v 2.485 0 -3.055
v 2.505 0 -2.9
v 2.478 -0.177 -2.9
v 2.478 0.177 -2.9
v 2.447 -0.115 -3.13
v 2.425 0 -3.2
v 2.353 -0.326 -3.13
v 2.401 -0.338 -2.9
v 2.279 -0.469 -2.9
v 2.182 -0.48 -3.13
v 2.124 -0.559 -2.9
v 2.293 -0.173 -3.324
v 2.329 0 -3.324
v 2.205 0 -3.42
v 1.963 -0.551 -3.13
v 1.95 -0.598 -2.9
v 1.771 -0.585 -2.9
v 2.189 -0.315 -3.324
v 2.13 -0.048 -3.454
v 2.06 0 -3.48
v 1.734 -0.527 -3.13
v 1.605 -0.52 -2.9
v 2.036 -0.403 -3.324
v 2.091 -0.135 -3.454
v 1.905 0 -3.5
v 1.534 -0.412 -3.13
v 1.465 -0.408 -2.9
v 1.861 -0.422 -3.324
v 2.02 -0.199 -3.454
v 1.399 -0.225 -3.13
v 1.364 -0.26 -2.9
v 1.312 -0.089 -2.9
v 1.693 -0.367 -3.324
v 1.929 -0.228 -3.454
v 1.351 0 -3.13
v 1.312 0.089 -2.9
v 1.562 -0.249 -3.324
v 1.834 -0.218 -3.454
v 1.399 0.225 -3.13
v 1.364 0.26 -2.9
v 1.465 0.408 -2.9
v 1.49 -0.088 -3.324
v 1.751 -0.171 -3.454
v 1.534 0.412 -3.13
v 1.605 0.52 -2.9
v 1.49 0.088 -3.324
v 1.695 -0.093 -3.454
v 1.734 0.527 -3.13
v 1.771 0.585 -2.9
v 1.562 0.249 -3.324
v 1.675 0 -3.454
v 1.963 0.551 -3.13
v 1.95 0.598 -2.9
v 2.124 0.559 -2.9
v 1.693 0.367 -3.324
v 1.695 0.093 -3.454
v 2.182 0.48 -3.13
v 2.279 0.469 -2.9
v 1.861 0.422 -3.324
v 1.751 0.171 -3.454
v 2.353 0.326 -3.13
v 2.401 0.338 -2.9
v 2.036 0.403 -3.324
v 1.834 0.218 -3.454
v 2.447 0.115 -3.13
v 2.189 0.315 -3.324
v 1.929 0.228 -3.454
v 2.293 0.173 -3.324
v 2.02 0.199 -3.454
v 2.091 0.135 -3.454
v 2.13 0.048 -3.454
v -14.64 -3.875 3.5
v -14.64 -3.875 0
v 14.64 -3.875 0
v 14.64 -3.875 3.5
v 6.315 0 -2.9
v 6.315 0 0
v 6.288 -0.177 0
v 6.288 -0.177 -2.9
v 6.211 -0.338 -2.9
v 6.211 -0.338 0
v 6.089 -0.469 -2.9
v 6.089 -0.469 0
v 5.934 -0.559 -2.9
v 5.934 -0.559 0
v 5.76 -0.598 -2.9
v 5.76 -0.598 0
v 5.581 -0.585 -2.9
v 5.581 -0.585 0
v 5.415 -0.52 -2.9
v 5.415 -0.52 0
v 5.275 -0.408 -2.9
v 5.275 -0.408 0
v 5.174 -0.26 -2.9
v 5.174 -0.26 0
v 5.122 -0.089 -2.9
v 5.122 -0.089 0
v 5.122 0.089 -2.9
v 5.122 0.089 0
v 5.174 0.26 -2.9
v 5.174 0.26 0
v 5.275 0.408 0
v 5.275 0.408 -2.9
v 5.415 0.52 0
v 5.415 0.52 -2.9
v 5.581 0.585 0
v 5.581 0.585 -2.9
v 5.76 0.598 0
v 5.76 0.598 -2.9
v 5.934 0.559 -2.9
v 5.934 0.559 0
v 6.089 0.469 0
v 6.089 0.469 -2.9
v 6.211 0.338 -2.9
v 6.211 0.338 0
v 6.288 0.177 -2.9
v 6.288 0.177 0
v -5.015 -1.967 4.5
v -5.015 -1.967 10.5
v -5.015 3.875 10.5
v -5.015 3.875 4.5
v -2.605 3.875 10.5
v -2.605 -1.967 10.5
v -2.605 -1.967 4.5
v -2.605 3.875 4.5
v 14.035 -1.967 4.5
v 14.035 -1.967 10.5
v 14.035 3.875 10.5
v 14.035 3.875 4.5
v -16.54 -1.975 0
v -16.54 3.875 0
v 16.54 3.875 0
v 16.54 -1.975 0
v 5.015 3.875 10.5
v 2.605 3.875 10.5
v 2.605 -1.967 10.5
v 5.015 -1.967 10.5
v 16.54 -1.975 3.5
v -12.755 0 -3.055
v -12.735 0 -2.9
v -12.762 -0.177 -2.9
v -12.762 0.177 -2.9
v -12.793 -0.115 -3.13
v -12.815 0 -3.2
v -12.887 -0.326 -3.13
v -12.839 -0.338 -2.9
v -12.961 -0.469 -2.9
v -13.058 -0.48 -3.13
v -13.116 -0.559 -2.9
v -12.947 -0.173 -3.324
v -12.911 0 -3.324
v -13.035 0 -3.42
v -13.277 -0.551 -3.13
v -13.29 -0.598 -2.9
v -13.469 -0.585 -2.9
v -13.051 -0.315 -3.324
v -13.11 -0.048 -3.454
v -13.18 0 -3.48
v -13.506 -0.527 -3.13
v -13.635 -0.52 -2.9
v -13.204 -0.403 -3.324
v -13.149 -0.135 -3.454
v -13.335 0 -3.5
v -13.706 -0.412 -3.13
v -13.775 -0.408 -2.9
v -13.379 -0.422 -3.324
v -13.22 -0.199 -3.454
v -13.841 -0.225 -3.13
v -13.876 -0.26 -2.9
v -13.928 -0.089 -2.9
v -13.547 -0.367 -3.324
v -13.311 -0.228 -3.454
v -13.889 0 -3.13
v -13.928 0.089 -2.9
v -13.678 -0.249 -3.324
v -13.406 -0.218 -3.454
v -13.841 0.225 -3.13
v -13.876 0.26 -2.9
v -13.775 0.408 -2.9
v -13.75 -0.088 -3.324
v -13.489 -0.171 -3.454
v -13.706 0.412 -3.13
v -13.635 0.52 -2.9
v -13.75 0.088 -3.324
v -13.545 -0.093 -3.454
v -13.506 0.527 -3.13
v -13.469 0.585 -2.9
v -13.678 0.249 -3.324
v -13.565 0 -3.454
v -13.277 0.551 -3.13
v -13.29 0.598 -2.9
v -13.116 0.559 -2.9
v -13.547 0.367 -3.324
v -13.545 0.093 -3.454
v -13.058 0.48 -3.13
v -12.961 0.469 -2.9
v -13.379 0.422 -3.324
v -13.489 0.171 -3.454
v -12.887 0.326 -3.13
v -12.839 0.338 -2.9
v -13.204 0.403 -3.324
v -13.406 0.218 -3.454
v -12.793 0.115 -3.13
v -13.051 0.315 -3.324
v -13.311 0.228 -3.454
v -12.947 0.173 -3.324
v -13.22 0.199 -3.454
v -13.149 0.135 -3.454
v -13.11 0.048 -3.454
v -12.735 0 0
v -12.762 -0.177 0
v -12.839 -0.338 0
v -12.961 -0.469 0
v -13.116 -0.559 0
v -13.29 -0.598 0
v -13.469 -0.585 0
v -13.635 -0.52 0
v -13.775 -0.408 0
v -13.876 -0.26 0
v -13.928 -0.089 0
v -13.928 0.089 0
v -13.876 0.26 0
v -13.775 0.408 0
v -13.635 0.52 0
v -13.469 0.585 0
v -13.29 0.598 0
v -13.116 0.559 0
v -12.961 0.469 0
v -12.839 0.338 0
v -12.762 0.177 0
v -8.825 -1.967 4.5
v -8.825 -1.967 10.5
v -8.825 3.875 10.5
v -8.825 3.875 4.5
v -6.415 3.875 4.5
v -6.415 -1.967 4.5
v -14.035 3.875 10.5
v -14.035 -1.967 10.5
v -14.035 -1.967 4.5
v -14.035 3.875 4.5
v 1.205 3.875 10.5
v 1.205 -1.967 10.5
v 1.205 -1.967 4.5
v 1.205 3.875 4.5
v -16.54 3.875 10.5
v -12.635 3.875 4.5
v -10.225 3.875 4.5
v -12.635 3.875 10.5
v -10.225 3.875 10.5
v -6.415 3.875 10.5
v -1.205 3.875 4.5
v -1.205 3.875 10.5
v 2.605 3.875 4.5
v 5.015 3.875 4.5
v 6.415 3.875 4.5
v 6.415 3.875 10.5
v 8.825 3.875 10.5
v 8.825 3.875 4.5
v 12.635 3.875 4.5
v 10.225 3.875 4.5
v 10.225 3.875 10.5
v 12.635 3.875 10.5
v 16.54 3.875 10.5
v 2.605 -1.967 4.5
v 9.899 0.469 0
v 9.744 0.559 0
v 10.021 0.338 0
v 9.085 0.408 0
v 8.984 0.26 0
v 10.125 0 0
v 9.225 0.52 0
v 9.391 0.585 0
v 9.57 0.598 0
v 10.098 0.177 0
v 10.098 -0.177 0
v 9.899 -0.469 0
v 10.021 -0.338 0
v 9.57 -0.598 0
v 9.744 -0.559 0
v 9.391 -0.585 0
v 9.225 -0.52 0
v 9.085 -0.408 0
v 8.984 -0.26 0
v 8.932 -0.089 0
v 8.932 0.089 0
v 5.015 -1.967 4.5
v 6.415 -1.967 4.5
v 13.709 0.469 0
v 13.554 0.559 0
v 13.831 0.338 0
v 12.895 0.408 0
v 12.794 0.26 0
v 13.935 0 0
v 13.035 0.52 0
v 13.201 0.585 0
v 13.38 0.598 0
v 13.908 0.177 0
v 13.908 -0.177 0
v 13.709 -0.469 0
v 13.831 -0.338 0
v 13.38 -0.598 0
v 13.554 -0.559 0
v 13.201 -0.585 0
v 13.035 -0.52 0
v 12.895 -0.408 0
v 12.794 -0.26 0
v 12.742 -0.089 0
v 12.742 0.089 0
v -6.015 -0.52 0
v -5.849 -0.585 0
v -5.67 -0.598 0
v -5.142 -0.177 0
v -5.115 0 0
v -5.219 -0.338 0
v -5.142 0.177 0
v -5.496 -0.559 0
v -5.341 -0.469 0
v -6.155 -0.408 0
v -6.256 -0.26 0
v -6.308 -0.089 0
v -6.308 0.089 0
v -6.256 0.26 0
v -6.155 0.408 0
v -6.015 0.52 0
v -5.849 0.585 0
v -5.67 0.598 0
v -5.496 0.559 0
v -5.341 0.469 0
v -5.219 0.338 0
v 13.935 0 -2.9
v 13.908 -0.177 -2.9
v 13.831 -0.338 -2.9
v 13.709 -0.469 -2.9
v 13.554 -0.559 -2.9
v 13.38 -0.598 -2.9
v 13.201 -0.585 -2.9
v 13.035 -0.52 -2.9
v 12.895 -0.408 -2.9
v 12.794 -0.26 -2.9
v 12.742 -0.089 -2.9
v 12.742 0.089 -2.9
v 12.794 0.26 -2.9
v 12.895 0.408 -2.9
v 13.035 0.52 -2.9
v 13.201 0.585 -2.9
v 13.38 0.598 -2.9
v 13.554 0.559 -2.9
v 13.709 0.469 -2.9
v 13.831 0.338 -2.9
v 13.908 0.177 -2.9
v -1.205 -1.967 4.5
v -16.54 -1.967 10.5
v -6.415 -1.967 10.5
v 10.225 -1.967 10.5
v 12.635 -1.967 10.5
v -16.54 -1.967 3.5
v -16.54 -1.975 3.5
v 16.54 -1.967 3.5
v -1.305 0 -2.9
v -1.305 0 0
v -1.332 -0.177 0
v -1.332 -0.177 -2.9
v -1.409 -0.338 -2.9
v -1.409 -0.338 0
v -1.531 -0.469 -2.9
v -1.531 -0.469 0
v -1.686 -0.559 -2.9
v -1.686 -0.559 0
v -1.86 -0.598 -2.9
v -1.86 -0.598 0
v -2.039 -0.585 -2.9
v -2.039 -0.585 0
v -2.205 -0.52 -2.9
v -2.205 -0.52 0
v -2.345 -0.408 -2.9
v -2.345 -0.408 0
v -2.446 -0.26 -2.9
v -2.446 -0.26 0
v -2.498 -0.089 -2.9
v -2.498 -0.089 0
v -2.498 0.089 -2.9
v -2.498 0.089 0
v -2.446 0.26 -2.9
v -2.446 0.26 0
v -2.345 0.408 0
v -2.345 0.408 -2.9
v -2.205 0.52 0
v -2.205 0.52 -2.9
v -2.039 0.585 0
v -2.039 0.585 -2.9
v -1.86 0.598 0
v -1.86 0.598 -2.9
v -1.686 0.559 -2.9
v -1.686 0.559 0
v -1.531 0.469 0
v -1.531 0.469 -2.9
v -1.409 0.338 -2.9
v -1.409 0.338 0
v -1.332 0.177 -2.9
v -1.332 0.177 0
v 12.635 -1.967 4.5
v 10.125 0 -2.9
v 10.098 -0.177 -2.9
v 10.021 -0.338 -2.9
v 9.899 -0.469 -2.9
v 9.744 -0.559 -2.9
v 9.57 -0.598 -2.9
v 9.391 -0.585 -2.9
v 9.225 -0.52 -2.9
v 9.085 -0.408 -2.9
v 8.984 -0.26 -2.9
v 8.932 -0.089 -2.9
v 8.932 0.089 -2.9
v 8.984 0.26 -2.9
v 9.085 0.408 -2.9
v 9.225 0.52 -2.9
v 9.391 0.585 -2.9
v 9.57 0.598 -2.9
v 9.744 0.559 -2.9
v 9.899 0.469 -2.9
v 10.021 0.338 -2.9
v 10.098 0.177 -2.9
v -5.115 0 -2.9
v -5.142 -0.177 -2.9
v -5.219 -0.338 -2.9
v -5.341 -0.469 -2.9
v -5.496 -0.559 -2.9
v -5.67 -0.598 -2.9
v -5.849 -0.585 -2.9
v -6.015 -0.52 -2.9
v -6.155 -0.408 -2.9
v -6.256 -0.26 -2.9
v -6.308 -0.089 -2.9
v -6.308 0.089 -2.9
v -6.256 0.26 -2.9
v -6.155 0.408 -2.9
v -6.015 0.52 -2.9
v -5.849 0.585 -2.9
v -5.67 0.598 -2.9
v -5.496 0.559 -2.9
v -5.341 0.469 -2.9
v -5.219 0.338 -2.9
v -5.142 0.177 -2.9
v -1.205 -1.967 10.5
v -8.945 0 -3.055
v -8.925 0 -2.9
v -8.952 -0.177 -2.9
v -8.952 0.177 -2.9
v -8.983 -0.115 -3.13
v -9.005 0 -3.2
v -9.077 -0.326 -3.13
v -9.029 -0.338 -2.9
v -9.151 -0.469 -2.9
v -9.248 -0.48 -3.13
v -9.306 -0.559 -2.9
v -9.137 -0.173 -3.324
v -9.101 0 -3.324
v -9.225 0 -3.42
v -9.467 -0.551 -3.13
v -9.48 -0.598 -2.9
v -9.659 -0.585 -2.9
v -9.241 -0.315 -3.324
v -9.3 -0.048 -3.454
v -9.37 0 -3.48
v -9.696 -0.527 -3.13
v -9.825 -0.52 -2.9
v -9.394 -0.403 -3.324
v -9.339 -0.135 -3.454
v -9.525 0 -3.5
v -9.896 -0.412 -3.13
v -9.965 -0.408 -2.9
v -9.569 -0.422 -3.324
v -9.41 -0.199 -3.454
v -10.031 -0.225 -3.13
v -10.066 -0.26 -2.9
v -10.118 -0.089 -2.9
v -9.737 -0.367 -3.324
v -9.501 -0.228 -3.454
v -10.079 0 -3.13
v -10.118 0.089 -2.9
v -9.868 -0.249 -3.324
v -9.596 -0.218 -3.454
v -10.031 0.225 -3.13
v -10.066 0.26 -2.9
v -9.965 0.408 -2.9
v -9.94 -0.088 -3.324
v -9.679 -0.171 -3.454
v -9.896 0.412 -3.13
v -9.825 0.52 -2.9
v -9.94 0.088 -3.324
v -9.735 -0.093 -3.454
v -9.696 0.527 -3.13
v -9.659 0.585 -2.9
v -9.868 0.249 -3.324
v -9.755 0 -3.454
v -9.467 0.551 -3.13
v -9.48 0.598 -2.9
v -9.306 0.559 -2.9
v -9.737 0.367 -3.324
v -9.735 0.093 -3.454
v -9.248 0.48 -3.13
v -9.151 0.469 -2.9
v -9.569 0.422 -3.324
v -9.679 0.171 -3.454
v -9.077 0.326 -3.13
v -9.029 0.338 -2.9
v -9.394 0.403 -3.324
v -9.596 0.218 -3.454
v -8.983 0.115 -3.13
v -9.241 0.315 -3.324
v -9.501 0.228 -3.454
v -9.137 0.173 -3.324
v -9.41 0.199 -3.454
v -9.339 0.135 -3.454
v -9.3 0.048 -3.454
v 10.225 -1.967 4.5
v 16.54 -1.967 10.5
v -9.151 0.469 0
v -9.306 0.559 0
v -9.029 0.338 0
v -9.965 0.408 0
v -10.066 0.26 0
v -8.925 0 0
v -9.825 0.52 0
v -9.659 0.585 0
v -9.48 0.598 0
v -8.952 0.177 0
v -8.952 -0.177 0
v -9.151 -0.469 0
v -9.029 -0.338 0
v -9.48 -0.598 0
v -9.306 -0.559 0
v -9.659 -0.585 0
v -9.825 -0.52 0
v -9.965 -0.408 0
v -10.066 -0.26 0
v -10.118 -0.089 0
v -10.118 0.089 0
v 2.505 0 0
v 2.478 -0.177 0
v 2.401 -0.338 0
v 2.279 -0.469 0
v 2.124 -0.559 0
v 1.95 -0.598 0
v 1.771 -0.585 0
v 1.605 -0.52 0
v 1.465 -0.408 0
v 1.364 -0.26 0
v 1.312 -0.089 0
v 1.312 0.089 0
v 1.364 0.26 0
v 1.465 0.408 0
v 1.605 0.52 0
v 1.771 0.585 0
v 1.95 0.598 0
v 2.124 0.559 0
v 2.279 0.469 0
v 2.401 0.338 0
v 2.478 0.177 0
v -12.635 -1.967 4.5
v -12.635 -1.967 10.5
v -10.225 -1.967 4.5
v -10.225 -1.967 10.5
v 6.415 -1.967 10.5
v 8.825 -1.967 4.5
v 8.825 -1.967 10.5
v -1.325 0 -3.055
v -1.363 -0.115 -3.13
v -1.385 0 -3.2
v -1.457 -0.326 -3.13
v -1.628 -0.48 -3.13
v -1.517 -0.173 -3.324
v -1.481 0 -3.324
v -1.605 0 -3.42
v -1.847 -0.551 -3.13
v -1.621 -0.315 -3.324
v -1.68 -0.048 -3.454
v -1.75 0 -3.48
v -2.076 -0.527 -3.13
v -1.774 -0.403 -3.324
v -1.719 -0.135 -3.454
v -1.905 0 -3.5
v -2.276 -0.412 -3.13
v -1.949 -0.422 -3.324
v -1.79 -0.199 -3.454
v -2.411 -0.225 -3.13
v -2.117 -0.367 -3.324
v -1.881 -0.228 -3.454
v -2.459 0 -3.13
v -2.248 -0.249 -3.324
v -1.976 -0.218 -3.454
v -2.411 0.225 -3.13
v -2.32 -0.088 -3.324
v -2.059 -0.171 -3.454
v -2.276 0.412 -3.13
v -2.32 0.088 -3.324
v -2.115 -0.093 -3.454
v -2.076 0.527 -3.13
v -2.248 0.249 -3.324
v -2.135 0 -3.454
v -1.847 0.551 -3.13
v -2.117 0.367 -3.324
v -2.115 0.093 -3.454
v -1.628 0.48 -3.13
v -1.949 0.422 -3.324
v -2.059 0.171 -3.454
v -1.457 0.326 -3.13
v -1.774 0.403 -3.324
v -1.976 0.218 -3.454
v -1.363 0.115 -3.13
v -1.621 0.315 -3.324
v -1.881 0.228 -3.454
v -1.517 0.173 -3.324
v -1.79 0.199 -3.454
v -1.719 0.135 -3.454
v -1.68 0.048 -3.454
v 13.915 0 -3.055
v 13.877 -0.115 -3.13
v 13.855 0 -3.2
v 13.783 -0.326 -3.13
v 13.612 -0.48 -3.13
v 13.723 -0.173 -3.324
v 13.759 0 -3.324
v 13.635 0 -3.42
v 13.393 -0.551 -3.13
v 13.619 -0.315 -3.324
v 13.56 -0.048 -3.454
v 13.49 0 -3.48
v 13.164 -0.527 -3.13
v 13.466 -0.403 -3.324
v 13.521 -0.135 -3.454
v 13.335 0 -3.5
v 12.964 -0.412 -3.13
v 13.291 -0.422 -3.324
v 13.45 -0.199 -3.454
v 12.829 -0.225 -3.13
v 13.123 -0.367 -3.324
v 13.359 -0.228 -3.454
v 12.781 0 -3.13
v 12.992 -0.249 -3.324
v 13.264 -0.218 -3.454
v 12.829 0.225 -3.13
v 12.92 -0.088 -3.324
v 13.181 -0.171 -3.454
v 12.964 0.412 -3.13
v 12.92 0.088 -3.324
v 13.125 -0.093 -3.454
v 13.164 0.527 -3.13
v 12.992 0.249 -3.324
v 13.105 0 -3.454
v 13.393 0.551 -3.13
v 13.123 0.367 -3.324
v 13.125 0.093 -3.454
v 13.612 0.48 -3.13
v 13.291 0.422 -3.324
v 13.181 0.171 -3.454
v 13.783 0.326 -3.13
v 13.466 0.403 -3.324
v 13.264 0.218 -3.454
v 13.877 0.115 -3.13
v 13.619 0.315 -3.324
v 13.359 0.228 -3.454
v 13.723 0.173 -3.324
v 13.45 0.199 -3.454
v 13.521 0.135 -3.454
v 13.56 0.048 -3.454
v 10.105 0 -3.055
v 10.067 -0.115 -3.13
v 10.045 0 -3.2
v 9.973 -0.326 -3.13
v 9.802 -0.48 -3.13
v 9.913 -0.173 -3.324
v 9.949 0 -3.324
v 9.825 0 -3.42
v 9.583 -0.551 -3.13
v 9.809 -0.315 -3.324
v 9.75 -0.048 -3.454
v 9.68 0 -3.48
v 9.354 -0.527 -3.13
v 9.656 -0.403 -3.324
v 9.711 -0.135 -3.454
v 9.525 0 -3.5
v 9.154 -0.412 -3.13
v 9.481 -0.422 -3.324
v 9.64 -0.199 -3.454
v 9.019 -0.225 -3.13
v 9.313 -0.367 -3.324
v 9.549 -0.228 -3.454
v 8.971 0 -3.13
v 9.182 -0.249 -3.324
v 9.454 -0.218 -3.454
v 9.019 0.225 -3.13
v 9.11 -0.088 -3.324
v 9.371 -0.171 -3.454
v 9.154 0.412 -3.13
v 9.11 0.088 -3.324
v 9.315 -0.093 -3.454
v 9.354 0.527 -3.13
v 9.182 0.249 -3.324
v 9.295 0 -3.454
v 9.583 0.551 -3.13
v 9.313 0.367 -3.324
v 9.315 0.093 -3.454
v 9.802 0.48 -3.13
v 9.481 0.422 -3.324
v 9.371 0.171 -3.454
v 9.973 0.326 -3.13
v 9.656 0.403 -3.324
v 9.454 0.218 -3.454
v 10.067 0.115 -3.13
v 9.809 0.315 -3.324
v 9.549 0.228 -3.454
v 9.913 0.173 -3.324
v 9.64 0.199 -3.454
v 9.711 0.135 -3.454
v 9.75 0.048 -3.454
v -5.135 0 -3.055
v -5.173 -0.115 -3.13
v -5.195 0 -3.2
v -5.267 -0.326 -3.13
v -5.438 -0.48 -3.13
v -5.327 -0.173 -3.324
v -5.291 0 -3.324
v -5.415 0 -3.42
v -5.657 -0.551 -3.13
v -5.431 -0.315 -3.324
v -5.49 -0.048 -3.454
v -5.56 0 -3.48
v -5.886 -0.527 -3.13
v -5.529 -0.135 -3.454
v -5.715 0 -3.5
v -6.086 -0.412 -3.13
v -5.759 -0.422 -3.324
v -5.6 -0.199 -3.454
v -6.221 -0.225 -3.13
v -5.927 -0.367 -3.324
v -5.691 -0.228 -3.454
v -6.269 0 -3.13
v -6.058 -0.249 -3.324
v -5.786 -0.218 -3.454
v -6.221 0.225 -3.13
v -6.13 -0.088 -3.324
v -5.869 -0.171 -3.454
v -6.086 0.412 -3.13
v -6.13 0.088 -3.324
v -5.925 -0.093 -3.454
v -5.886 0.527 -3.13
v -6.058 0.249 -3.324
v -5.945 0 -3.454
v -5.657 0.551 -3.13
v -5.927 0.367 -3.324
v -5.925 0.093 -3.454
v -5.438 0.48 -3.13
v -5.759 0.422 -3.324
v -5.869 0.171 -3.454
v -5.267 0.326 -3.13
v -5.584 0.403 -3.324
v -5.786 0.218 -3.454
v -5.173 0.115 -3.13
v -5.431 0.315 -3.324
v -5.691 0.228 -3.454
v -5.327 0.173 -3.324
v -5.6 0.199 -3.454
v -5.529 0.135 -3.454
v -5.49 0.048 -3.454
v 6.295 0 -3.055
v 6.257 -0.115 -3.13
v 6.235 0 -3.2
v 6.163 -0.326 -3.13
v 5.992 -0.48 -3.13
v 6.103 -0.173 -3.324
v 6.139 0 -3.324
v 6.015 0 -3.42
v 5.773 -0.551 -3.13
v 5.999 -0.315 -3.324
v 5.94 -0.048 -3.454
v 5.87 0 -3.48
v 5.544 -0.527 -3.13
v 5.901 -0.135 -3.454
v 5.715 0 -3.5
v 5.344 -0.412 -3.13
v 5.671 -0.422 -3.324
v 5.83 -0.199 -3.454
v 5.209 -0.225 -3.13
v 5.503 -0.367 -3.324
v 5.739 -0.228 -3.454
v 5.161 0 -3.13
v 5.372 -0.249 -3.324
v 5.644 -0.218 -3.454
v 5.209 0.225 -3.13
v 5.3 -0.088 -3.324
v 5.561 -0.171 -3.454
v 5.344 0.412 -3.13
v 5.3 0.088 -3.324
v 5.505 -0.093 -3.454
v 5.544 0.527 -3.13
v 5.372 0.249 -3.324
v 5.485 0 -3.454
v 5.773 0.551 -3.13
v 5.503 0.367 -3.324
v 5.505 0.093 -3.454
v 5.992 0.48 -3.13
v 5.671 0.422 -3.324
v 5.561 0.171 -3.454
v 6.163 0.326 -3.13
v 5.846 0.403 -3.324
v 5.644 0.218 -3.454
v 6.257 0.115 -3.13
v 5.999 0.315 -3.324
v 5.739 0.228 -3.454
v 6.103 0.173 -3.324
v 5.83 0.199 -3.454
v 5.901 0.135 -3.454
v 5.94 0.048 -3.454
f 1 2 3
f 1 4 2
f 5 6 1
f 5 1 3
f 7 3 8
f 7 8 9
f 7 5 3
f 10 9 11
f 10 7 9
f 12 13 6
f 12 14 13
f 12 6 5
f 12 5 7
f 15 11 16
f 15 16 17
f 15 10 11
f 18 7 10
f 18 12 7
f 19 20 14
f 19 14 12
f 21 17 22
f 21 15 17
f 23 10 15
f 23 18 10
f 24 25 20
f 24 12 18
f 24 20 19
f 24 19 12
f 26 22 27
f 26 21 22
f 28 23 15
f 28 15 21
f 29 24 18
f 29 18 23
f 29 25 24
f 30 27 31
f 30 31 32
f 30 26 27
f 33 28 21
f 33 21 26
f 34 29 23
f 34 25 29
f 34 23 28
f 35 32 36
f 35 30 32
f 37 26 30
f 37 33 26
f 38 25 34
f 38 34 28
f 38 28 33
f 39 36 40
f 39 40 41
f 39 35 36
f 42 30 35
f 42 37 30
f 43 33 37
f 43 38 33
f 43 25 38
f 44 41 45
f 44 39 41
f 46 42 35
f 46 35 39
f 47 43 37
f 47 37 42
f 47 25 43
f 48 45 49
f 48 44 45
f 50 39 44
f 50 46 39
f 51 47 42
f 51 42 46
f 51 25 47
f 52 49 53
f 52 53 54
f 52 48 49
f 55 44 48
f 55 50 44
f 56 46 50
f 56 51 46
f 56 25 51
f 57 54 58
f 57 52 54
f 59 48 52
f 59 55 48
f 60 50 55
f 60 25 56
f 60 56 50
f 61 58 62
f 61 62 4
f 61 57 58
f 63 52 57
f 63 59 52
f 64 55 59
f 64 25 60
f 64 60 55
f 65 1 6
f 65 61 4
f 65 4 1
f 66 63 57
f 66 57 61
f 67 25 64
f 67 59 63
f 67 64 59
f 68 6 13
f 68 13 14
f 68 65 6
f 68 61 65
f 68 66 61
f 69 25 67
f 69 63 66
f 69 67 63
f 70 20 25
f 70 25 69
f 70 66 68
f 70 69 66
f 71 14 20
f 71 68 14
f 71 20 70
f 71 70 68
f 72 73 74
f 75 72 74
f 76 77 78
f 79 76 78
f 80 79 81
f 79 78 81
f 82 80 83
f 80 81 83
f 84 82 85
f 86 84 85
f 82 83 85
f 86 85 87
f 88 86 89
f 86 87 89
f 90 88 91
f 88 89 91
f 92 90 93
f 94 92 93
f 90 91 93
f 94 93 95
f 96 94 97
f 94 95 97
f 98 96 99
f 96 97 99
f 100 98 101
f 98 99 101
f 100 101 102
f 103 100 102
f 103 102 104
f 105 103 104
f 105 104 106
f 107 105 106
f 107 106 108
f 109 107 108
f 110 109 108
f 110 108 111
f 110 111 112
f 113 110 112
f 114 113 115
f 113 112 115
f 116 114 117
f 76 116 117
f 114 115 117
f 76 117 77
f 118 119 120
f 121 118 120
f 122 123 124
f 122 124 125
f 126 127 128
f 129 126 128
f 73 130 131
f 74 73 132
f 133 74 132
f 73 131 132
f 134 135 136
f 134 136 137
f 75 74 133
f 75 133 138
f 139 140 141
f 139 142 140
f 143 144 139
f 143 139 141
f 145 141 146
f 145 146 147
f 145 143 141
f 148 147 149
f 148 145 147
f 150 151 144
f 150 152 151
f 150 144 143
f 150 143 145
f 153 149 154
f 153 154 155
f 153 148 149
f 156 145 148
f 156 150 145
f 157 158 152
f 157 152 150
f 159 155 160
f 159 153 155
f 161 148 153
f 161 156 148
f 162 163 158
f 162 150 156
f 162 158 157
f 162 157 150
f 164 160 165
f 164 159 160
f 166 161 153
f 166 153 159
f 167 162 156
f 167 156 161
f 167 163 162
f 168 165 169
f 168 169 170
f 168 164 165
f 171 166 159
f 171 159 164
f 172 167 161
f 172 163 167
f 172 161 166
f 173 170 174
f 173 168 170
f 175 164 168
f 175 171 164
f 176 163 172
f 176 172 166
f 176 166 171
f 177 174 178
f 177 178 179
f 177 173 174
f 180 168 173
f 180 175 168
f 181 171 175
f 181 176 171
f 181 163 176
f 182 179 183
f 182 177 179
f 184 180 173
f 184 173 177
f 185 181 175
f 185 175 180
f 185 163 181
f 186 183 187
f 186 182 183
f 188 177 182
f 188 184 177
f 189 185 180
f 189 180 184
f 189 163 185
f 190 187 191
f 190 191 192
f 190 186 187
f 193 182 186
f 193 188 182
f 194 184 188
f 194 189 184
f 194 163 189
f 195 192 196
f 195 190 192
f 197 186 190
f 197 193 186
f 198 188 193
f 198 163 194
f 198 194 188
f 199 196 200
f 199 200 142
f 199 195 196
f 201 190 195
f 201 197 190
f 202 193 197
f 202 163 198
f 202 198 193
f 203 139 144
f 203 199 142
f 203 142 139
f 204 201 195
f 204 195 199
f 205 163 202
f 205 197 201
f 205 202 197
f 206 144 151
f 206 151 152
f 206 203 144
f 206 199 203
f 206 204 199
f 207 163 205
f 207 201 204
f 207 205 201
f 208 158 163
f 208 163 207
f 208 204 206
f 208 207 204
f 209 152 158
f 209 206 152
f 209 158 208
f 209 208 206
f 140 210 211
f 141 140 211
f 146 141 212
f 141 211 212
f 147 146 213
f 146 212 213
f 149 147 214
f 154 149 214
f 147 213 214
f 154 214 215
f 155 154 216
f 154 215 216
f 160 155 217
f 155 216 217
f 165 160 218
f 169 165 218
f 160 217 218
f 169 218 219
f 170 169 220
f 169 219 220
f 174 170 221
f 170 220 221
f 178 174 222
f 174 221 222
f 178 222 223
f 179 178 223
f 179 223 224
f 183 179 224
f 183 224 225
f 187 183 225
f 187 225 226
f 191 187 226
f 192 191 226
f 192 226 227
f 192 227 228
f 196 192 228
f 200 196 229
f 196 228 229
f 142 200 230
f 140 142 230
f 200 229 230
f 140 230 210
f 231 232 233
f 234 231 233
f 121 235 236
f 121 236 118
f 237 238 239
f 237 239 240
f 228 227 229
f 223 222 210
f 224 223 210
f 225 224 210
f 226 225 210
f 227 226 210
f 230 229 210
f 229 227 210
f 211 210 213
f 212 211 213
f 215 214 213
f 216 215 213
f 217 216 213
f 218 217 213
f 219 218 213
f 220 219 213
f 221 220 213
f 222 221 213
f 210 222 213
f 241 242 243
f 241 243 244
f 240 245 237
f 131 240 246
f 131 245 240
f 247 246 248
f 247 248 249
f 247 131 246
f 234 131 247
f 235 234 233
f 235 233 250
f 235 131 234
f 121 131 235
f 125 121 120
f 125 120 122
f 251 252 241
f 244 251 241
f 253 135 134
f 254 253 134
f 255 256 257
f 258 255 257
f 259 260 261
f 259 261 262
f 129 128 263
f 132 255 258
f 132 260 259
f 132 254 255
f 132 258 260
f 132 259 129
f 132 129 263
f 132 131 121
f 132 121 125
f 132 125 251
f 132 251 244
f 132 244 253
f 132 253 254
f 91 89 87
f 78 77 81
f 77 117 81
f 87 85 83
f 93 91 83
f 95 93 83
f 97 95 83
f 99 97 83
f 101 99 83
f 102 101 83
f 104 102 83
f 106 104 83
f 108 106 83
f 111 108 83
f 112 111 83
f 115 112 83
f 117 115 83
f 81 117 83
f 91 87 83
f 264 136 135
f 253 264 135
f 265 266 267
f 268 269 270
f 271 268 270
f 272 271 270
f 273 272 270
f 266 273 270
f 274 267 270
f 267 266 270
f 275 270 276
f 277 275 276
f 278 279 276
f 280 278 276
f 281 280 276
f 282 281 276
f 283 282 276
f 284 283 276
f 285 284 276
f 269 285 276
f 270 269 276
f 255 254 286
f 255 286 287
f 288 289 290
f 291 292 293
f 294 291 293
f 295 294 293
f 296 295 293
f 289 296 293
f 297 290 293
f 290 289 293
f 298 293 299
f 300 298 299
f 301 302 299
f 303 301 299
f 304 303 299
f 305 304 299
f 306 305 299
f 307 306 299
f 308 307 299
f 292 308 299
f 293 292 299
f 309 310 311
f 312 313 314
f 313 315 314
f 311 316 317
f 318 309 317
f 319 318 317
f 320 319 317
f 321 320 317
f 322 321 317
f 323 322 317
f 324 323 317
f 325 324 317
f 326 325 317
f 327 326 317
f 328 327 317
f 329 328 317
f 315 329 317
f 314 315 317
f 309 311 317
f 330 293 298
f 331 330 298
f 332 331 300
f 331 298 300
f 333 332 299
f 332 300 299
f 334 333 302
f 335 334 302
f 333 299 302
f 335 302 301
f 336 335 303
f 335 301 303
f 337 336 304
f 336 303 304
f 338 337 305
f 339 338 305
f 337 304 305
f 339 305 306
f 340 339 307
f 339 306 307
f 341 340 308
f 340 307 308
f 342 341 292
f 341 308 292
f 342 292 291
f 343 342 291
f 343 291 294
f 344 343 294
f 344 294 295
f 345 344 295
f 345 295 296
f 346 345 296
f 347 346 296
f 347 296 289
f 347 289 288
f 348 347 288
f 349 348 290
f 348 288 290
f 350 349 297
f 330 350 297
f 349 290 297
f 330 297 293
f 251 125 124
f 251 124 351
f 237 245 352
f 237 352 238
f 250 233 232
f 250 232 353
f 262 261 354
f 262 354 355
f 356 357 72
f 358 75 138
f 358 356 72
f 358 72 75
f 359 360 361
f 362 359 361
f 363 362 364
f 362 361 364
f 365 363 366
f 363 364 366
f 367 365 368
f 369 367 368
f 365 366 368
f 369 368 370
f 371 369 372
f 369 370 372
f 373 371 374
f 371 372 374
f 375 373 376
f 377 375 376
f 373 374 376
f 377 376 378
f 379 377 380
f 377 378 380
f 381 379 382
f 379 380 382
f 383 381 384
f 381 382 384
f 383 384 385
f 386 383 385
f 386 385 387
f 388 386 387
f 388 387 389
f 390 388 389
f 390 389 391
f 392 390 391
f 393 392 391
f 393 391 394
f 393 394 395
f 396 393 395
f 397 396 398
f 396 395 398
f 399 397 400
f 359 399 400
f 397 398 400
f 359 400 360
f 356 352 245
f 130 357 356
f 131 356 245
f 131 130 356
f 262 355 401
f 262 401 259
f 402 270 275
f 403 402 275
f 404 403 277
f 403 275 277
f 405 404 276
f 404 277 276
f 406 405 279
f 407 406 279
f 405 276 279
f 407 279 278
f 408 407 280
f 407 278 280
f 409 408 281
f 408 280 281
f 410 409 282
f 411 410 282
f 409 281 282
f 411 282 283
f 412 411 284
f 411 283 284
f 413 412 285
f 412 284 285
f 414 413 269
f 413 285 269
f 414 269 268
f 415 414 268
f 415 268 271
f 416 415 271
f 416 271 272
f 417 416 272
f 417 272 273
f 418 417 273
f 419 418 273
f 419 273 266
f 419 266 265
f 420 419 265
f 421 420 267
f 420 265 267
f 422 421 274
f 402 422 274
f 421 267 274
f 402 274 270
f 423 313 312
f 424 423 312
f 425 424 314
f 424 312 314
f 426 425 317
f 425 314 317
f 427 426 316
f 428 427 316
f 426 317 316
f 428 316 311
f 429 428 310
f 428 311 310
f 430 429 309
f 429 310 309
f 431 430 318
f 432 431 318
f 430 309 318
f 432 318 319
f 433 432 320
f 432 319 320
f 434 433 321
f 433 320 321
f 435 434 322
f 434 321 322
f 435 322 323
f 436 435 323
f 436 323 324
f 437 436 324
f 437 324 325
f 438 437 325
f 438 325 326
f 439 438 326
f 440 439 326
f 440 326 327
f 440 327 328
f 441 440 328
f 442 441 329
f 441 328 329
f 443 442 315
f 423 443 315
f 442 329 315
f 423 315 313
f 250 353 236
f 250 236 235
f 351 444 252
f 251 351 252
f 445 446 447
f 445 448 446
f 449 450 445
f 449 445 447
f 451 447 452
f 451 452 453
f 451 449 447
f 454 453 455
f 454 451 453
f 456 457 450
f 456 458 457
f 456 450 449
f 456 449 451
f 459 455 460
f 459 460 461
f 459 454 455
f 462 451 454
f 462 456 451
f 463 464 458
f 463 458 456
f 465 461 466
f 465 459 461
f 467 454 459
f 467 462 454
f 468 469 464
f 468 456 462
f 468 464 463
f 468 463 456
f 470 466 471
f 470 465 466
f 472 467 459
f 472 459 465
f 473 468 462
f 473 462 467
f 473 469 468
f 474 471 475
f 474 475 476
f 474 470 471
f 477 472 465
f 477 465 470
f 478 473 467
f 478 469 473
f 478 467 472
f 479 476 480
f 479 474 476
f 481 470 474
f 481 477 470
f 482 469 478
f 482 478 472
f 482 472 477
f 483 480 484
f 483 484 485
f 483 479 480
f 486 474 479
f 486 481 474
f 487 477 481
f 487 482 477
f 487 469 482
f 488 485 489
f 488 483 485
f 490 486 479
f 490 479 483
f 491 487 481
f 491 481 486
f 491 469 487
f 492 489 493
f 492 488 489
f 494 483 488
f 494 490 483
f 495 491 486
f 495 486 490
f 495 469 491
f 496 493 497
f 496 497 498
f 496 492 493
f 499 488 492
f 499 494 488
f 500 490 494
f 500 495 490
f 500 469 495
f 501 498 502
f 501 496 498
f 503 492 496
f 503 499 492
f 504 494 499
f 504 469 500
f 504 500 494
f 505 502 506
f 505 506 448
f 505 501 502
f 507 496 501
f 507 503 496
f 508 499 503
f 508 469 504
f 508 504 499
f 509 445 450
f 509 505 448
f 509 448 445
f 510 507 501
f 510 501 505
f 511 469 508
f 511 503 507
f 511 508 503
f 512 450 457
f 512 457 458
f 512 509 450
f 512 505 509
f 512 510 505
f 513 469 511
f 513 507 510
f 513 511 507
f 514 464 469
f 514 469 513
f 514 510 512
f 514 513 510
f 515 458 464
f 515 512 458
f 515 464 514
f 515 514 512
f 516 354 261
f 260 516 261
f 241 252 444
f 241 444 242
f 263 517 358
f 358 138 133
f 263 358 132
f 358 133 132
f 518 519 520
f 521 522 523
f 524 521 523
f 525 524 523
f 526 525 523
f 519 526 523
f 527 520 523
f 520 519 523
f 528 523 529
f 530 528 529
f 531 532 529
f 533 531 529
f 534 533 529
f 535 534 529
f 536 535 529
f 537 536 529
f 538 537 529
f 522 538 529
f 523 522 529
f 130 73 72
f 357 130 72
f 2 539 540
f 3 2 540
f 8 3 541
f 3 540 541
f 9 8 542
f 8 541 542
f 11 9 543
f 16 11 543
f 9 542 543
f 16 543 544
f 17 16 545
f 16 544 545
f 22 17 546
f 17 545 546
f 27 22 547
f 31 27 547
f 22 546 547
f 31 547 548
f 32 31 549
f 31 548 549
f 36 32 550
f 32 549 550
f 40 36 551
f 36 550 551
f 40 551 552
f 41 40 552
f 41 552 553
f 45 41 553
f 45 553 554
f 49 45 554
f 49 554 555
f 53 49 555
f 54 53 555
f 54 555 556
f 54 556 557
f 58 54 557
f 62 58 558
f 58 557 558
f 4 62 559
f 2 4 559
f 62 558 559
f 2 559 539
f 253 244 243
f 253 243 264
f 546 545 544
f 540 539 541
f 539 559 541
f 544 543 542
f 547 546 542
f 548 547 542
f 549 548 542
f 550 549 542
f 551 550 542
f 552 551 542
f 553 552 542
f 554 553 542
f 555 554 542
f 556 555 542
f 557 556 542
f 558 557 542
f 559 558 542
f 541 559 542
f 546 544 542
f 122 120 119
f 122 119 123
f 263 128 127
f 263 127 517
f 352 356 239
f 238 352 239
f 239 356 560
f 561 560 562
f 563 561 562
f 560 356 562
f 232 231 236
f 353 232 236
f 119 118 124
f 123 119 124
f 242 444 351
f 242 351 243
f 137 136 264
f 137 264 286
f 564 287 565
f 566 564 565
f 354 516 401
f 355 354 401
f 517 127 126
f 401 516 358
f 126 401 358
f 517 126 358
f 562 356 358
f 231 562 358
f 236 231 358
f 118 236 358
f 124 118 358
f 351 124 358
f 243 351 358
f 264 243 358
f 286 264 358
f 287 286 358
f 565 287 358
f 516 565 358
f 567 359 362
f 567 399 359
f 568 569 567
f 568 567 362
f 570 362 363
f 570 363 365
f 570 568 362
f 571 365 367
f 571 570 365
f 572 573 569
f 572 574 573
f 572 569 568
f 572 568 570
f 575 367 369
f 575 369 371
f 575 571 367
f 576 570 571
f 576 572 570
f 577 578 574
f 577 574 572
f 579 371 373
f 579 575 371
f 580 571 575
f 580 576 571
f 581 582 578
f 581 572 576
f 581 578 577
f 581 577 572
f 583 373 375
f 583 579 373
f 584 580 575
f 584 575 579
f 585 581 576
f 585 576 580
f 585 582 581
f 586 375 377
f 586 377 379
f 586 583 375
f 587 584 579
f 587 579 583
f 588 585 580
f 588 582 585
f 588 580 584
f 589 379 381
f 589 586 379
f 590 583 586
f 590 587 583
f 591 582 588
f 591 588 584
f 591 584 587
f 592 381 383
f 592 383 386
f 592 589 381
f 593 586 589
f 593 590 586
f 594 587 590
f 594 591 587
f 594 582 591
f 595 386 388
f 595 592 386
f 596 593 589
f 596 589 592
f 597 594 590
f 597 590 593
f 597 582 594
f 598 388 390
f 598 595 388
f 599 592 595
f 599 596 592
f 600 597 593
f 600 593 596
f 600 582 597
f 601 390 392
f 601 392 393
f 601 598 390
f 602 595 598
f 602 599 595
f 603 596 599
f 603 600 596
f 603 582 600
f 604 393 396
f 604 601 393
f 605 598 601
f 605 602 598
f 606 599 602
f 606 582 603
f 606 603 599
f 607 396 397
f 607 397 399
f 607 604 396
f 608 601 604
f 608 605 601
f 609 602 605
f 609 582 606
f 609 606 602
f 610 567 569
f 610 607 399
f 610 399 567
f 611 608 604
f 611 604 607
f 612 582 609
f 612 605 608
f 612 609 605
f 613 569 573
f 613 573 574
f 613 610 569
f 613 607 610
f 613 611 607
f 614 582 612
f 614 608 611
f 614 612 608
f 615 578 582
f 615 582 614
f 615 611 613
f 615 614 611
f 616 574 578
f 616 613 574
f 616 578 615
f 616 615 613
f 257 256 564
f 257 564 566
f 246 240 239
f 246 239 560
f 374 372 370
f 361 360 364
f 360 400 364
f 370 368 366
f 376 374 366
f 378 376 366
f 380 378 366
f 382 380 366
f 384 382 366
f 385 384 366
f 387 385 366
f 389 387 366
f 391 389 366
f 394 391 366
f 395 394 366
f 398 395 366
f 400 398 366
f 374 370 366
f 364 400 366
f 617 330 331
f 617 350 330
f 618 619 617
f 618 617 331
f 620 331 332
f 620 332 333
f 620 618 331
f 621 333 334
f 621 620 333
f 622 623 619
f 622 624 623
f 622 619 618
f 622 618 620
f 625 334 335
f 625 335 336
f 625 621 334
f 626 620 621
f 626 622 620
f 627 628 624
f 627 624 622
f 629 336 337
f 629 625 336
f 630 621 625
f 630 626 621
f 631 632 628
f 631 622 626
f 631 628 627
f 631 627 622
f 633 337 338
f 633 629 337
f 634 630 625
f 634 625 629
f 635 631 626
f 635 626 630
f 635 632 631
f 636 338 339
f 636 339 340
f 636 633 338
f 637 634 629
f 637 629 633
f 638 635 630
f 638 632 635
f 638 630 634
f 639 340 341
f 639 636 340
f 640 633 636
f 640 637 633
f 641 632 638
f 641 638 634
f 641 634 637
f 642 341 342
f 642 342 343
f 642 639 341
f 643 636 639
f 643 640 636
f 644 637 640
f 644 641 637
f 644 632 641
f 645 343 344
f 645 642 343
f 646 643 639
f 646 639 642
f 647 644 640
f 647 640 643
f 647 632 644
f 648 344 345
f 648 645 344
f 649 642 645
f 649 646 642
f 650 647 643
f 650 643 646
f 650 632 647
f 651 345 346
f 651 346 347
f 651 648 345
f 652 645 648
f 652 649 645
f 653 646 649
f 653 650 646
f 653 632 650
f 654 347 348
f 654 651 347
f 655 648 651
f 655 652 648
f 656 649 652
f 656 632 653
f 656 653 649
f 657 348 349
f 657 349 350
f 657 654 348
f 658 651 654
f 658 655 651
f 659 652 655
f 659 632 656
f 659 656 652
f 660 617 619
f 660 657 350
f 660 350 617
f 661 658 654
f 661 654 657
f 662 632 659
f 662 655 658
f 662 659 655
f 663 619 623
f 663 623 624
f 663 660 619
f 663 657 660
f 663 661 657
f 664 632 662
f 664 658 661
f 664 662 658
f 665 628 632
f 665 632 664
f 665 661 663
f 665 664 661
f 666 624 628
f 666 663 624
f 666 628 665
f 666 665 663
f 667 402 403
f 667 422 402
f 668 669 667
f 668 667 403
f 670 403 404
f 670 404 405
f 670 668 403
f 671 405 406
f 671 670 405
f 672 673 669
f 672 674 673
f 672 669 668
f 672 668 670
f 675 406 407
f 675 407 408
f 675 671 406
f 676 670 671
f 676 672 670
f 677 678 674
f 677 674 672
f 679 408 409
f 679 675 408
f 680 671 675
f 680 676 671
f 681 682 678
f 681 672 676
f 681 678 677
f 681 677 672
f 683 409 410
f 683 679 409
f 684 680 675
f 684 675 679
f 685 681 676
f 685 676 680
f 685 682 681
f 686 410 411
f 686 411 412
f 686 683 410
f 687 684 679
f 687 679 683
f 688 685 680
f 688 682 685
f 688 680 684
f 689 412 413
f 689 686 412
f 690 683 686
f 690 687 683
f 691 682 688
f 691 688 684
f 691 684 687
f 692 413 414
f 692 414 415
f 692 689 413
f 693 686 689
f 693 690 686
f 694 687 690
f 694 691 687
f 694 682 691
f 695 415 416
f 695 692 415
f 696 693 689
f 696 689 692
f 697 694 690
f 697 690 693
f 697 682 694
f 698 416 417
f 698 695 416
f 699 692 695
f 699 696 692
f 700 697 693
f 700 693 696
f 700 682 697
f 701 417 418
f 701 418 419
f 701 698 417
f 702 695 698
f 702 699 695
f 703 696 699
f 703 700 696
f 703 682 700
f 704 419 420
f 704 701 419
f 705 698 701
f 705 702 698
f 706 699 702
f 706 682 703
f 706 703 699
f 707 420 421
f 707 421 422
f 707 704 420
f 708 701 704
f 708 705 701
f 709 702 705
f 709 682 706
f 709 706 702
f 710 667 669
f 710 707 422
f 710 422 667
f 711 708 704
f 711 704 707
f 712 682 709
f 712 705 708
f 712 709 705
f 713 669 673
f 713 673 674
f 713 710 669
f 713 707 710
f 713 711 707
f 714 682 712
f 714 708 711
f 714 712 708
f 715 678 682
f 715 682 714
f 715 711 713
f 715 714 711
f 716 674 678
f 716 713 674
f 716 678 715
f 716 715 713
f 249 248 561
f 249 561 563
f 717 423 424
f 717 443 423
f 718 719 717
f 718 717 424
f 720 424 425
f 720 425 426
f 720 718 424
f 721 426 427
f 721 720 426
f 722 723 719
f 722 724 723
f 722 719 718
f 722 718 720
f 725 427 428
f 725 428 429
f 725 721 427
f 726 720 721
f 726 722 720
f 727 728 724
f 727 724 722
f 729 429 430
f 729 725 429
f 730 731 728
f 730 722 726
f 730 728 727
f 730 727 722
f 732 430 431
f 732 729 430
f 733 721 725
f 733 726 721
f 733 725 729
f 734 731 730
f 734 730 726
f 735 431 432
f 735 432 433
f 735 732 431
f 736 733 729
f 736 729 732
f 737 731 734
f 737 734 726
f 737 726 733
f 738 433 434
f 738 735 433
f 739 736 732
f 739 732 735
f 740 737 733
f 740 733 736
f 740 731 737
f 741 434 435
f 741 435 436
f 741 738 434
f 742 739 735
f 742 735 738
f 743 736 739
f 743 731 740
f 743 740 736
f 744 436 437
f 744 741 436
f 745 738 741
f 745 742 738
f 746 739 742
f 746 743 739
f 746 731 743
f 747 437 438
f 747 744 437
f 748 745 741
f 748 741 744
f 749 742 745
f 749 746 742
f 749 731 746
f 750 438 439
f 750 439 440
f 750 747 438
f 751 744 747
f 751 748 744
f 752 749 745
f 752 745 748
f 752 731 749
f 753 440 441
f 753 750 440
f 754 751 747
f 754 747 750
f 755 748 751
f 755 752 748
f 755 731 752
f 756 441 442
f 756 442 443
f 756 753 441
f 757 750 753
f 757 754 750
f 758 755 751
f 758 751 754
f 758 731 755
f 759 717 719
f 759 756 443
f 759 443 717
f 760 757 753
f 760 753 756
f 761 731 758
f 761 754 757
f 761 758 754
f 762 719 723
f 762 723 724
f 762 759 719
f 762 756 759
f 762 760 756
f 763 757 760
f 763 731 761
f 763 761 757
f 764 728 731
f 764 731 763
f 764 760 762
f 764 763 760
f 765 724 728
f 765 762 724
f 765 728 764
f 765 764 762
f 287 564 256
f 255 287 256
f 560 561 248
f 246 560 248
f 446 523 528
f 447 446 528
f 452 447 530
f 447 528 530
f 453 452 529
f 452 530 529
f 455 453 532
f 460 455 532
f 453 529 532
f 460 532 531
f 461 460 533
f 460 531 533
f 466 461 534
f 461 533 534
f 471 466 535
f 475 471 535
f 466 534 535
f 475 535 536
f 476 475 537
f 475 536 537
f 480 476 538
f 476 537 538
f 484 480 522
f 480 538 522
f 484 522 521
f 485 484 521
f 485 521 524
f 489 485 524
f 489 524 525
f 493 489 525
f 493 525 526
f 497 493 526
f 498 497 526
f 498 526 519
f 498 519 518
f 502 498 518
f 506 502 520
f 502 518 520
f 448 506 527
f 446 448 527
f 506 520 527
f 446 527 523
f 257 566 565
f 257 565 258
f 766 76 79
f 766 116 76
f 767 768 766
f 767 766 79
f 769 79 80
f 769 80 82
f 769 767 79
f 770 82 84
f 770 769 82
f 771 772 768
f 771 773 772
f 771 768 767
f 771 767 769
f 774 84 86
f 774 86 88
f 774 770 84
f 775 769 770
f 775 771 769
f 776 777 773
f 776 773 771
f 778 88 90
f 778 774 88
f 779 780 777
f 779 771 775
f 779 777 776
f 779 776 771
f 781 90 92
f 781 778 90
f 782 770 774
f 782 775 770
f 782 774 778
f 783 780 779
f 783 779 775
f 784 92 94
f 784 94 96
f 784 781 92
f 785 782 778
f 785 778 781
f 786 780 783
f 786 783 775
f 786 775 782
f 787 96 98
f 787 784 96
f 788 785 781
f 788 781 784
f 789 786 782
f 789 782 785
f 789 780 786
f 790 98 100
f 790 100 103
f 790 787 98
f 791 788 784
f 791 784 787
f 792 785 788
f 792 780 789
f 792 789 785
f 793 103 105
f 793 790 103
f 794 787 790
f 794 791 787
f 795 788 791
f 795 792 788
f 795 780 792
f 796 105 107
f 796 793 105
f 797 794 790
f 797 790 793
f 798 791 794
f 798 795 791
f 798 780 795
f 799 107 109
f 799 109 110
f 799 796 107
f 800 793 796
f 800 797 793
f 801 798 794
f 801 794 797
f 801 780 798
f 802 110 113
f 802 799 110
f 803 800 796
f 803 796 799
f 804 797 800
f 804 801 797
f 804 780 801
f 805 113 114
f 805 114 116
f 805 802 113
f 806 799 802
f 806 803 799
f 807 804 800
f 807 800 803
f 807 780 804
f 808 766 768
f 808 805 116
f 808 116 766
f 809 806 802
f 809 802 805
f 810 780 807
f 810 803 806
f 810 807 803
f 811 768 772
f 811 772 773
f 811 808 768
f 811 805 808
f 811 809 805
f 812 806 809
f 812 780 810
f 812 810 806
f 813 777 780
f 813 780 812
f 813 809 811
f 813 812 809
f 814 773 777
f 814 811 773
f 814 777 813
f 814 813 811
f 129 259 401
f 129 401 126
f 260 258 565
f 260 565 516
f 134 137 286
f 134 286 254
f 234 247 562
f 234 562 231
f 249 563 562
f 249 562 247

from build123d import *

# Parameters (mm, degrees)
F0_W     = 33.08
F0_H     = 7.75
F1_DEPTH = 3.5
F2_W     = 33.08
F2_H     = 5.842
F3_DEPTH = 7
F4_SIZE  = 1.9
F5_W     = 1.4
F5_H     = 5.842
F6_DEPTH = 6
F7_R     = 0.6
F8_DEPTH = 3.5
F9_R     = 0.6


with BuildPart() as f1:
    # F0 (on Top) → F1 (new body)
    with BuildSketch(Plane.XY):
        Rectangle(F0_W, F0_H)
    extrude(amount=F1_DEPTH)

    # F2 (on face) → F3 (join)
    with BuildSketch(Plane.XY.offset(3.5)):
        with Locations((0, 0.954)):
            Rectangle(F2_W, F2_H)
    extrude(amount=F3_DEPTH)

    # F4
    f4_edges = [f1.edges().sort_by_distance(p)[0] for p in [
        (16.54, -3.875, 1.75),
        (-16.54, -3.875, 1.75),
    ]]
    chamfer(f4_edges, length=F4_SIZE)

    # F5 (on face) → F6 (cut)
    with BuildSketch(Plane.XY.offset(10.5)):
        with Locations((-13.335, 0.954)):
            Rectangle(F5_W, F5_H)
        with Locations((-9.525, 0.954)):
            Rectangle(F5_W, F5_H)
        with Locations((-5.715, 0.954)):
            Rectangle(F5_W, F5_H)
        with Locations((-1.905, 0.954)):
            Rectangle(F5_W, F5_H)
        with Locations((1.905, 0.954)):
            Rectangle(F5_W, F5_H)
        with Locations((5.715, 0.954)):
            Rectangle(F5_W, F5_H)
        with Locations((9.525, 0.954)):
            Rectangle(F5_W, F5_H)
        with Locations((13.335, 0.954)):
            Rectangle(F5_W, F5_H)
    extrude(amount=-F6_DEPTH, mode=Mode.SUBTRACT)


with BuildPart() as f8:
    # F7 (on face) → F8 (new body)
    with BuildSketch(Plane(origin=(0, 0, 0), x_dir=(1, 0, 0), z_dir=(0, 0, -1))):
        with Locations((-13.335, 0)):
            Circle(F7_R)
        with Locations((-9.525, 0)):
            Circle(F7_R)
        with Locations((-5.715, 0)):
            Circle(F7_R)
        with Locations((-1.905, 0)):
            Circle(F7_R)
        with Locations((1.905, 0)):
            Circle(F7_R)
        with Locations((5.715, 0)):
            Circle(F7_R)
        with Locations((9.525, 0)):
            Circle(F7_R)
        with Locations((13.335, 0)):
            Circle(F7_R)
    extrude(amount=F8_DEPTH)

    # F9
    f9_edges = [f8.edges().sort_by_distance(p)[0] for p in [
        (-13.935, 0, -3.5),
        (-10.125, 0, -3.5),
        (-6.315, 0, -3.5),
        (-2.505, 0, -3.5),
        (1.305, 0, -3.5),
        (5.115, 0, -3.5),
        (8.925, 0, -3.5),
        (12.735, 0, -3.5),
    ]]
    fillet(f9_edges, radius=F9_R)


solid = Compound([f1.part, f8.part])
